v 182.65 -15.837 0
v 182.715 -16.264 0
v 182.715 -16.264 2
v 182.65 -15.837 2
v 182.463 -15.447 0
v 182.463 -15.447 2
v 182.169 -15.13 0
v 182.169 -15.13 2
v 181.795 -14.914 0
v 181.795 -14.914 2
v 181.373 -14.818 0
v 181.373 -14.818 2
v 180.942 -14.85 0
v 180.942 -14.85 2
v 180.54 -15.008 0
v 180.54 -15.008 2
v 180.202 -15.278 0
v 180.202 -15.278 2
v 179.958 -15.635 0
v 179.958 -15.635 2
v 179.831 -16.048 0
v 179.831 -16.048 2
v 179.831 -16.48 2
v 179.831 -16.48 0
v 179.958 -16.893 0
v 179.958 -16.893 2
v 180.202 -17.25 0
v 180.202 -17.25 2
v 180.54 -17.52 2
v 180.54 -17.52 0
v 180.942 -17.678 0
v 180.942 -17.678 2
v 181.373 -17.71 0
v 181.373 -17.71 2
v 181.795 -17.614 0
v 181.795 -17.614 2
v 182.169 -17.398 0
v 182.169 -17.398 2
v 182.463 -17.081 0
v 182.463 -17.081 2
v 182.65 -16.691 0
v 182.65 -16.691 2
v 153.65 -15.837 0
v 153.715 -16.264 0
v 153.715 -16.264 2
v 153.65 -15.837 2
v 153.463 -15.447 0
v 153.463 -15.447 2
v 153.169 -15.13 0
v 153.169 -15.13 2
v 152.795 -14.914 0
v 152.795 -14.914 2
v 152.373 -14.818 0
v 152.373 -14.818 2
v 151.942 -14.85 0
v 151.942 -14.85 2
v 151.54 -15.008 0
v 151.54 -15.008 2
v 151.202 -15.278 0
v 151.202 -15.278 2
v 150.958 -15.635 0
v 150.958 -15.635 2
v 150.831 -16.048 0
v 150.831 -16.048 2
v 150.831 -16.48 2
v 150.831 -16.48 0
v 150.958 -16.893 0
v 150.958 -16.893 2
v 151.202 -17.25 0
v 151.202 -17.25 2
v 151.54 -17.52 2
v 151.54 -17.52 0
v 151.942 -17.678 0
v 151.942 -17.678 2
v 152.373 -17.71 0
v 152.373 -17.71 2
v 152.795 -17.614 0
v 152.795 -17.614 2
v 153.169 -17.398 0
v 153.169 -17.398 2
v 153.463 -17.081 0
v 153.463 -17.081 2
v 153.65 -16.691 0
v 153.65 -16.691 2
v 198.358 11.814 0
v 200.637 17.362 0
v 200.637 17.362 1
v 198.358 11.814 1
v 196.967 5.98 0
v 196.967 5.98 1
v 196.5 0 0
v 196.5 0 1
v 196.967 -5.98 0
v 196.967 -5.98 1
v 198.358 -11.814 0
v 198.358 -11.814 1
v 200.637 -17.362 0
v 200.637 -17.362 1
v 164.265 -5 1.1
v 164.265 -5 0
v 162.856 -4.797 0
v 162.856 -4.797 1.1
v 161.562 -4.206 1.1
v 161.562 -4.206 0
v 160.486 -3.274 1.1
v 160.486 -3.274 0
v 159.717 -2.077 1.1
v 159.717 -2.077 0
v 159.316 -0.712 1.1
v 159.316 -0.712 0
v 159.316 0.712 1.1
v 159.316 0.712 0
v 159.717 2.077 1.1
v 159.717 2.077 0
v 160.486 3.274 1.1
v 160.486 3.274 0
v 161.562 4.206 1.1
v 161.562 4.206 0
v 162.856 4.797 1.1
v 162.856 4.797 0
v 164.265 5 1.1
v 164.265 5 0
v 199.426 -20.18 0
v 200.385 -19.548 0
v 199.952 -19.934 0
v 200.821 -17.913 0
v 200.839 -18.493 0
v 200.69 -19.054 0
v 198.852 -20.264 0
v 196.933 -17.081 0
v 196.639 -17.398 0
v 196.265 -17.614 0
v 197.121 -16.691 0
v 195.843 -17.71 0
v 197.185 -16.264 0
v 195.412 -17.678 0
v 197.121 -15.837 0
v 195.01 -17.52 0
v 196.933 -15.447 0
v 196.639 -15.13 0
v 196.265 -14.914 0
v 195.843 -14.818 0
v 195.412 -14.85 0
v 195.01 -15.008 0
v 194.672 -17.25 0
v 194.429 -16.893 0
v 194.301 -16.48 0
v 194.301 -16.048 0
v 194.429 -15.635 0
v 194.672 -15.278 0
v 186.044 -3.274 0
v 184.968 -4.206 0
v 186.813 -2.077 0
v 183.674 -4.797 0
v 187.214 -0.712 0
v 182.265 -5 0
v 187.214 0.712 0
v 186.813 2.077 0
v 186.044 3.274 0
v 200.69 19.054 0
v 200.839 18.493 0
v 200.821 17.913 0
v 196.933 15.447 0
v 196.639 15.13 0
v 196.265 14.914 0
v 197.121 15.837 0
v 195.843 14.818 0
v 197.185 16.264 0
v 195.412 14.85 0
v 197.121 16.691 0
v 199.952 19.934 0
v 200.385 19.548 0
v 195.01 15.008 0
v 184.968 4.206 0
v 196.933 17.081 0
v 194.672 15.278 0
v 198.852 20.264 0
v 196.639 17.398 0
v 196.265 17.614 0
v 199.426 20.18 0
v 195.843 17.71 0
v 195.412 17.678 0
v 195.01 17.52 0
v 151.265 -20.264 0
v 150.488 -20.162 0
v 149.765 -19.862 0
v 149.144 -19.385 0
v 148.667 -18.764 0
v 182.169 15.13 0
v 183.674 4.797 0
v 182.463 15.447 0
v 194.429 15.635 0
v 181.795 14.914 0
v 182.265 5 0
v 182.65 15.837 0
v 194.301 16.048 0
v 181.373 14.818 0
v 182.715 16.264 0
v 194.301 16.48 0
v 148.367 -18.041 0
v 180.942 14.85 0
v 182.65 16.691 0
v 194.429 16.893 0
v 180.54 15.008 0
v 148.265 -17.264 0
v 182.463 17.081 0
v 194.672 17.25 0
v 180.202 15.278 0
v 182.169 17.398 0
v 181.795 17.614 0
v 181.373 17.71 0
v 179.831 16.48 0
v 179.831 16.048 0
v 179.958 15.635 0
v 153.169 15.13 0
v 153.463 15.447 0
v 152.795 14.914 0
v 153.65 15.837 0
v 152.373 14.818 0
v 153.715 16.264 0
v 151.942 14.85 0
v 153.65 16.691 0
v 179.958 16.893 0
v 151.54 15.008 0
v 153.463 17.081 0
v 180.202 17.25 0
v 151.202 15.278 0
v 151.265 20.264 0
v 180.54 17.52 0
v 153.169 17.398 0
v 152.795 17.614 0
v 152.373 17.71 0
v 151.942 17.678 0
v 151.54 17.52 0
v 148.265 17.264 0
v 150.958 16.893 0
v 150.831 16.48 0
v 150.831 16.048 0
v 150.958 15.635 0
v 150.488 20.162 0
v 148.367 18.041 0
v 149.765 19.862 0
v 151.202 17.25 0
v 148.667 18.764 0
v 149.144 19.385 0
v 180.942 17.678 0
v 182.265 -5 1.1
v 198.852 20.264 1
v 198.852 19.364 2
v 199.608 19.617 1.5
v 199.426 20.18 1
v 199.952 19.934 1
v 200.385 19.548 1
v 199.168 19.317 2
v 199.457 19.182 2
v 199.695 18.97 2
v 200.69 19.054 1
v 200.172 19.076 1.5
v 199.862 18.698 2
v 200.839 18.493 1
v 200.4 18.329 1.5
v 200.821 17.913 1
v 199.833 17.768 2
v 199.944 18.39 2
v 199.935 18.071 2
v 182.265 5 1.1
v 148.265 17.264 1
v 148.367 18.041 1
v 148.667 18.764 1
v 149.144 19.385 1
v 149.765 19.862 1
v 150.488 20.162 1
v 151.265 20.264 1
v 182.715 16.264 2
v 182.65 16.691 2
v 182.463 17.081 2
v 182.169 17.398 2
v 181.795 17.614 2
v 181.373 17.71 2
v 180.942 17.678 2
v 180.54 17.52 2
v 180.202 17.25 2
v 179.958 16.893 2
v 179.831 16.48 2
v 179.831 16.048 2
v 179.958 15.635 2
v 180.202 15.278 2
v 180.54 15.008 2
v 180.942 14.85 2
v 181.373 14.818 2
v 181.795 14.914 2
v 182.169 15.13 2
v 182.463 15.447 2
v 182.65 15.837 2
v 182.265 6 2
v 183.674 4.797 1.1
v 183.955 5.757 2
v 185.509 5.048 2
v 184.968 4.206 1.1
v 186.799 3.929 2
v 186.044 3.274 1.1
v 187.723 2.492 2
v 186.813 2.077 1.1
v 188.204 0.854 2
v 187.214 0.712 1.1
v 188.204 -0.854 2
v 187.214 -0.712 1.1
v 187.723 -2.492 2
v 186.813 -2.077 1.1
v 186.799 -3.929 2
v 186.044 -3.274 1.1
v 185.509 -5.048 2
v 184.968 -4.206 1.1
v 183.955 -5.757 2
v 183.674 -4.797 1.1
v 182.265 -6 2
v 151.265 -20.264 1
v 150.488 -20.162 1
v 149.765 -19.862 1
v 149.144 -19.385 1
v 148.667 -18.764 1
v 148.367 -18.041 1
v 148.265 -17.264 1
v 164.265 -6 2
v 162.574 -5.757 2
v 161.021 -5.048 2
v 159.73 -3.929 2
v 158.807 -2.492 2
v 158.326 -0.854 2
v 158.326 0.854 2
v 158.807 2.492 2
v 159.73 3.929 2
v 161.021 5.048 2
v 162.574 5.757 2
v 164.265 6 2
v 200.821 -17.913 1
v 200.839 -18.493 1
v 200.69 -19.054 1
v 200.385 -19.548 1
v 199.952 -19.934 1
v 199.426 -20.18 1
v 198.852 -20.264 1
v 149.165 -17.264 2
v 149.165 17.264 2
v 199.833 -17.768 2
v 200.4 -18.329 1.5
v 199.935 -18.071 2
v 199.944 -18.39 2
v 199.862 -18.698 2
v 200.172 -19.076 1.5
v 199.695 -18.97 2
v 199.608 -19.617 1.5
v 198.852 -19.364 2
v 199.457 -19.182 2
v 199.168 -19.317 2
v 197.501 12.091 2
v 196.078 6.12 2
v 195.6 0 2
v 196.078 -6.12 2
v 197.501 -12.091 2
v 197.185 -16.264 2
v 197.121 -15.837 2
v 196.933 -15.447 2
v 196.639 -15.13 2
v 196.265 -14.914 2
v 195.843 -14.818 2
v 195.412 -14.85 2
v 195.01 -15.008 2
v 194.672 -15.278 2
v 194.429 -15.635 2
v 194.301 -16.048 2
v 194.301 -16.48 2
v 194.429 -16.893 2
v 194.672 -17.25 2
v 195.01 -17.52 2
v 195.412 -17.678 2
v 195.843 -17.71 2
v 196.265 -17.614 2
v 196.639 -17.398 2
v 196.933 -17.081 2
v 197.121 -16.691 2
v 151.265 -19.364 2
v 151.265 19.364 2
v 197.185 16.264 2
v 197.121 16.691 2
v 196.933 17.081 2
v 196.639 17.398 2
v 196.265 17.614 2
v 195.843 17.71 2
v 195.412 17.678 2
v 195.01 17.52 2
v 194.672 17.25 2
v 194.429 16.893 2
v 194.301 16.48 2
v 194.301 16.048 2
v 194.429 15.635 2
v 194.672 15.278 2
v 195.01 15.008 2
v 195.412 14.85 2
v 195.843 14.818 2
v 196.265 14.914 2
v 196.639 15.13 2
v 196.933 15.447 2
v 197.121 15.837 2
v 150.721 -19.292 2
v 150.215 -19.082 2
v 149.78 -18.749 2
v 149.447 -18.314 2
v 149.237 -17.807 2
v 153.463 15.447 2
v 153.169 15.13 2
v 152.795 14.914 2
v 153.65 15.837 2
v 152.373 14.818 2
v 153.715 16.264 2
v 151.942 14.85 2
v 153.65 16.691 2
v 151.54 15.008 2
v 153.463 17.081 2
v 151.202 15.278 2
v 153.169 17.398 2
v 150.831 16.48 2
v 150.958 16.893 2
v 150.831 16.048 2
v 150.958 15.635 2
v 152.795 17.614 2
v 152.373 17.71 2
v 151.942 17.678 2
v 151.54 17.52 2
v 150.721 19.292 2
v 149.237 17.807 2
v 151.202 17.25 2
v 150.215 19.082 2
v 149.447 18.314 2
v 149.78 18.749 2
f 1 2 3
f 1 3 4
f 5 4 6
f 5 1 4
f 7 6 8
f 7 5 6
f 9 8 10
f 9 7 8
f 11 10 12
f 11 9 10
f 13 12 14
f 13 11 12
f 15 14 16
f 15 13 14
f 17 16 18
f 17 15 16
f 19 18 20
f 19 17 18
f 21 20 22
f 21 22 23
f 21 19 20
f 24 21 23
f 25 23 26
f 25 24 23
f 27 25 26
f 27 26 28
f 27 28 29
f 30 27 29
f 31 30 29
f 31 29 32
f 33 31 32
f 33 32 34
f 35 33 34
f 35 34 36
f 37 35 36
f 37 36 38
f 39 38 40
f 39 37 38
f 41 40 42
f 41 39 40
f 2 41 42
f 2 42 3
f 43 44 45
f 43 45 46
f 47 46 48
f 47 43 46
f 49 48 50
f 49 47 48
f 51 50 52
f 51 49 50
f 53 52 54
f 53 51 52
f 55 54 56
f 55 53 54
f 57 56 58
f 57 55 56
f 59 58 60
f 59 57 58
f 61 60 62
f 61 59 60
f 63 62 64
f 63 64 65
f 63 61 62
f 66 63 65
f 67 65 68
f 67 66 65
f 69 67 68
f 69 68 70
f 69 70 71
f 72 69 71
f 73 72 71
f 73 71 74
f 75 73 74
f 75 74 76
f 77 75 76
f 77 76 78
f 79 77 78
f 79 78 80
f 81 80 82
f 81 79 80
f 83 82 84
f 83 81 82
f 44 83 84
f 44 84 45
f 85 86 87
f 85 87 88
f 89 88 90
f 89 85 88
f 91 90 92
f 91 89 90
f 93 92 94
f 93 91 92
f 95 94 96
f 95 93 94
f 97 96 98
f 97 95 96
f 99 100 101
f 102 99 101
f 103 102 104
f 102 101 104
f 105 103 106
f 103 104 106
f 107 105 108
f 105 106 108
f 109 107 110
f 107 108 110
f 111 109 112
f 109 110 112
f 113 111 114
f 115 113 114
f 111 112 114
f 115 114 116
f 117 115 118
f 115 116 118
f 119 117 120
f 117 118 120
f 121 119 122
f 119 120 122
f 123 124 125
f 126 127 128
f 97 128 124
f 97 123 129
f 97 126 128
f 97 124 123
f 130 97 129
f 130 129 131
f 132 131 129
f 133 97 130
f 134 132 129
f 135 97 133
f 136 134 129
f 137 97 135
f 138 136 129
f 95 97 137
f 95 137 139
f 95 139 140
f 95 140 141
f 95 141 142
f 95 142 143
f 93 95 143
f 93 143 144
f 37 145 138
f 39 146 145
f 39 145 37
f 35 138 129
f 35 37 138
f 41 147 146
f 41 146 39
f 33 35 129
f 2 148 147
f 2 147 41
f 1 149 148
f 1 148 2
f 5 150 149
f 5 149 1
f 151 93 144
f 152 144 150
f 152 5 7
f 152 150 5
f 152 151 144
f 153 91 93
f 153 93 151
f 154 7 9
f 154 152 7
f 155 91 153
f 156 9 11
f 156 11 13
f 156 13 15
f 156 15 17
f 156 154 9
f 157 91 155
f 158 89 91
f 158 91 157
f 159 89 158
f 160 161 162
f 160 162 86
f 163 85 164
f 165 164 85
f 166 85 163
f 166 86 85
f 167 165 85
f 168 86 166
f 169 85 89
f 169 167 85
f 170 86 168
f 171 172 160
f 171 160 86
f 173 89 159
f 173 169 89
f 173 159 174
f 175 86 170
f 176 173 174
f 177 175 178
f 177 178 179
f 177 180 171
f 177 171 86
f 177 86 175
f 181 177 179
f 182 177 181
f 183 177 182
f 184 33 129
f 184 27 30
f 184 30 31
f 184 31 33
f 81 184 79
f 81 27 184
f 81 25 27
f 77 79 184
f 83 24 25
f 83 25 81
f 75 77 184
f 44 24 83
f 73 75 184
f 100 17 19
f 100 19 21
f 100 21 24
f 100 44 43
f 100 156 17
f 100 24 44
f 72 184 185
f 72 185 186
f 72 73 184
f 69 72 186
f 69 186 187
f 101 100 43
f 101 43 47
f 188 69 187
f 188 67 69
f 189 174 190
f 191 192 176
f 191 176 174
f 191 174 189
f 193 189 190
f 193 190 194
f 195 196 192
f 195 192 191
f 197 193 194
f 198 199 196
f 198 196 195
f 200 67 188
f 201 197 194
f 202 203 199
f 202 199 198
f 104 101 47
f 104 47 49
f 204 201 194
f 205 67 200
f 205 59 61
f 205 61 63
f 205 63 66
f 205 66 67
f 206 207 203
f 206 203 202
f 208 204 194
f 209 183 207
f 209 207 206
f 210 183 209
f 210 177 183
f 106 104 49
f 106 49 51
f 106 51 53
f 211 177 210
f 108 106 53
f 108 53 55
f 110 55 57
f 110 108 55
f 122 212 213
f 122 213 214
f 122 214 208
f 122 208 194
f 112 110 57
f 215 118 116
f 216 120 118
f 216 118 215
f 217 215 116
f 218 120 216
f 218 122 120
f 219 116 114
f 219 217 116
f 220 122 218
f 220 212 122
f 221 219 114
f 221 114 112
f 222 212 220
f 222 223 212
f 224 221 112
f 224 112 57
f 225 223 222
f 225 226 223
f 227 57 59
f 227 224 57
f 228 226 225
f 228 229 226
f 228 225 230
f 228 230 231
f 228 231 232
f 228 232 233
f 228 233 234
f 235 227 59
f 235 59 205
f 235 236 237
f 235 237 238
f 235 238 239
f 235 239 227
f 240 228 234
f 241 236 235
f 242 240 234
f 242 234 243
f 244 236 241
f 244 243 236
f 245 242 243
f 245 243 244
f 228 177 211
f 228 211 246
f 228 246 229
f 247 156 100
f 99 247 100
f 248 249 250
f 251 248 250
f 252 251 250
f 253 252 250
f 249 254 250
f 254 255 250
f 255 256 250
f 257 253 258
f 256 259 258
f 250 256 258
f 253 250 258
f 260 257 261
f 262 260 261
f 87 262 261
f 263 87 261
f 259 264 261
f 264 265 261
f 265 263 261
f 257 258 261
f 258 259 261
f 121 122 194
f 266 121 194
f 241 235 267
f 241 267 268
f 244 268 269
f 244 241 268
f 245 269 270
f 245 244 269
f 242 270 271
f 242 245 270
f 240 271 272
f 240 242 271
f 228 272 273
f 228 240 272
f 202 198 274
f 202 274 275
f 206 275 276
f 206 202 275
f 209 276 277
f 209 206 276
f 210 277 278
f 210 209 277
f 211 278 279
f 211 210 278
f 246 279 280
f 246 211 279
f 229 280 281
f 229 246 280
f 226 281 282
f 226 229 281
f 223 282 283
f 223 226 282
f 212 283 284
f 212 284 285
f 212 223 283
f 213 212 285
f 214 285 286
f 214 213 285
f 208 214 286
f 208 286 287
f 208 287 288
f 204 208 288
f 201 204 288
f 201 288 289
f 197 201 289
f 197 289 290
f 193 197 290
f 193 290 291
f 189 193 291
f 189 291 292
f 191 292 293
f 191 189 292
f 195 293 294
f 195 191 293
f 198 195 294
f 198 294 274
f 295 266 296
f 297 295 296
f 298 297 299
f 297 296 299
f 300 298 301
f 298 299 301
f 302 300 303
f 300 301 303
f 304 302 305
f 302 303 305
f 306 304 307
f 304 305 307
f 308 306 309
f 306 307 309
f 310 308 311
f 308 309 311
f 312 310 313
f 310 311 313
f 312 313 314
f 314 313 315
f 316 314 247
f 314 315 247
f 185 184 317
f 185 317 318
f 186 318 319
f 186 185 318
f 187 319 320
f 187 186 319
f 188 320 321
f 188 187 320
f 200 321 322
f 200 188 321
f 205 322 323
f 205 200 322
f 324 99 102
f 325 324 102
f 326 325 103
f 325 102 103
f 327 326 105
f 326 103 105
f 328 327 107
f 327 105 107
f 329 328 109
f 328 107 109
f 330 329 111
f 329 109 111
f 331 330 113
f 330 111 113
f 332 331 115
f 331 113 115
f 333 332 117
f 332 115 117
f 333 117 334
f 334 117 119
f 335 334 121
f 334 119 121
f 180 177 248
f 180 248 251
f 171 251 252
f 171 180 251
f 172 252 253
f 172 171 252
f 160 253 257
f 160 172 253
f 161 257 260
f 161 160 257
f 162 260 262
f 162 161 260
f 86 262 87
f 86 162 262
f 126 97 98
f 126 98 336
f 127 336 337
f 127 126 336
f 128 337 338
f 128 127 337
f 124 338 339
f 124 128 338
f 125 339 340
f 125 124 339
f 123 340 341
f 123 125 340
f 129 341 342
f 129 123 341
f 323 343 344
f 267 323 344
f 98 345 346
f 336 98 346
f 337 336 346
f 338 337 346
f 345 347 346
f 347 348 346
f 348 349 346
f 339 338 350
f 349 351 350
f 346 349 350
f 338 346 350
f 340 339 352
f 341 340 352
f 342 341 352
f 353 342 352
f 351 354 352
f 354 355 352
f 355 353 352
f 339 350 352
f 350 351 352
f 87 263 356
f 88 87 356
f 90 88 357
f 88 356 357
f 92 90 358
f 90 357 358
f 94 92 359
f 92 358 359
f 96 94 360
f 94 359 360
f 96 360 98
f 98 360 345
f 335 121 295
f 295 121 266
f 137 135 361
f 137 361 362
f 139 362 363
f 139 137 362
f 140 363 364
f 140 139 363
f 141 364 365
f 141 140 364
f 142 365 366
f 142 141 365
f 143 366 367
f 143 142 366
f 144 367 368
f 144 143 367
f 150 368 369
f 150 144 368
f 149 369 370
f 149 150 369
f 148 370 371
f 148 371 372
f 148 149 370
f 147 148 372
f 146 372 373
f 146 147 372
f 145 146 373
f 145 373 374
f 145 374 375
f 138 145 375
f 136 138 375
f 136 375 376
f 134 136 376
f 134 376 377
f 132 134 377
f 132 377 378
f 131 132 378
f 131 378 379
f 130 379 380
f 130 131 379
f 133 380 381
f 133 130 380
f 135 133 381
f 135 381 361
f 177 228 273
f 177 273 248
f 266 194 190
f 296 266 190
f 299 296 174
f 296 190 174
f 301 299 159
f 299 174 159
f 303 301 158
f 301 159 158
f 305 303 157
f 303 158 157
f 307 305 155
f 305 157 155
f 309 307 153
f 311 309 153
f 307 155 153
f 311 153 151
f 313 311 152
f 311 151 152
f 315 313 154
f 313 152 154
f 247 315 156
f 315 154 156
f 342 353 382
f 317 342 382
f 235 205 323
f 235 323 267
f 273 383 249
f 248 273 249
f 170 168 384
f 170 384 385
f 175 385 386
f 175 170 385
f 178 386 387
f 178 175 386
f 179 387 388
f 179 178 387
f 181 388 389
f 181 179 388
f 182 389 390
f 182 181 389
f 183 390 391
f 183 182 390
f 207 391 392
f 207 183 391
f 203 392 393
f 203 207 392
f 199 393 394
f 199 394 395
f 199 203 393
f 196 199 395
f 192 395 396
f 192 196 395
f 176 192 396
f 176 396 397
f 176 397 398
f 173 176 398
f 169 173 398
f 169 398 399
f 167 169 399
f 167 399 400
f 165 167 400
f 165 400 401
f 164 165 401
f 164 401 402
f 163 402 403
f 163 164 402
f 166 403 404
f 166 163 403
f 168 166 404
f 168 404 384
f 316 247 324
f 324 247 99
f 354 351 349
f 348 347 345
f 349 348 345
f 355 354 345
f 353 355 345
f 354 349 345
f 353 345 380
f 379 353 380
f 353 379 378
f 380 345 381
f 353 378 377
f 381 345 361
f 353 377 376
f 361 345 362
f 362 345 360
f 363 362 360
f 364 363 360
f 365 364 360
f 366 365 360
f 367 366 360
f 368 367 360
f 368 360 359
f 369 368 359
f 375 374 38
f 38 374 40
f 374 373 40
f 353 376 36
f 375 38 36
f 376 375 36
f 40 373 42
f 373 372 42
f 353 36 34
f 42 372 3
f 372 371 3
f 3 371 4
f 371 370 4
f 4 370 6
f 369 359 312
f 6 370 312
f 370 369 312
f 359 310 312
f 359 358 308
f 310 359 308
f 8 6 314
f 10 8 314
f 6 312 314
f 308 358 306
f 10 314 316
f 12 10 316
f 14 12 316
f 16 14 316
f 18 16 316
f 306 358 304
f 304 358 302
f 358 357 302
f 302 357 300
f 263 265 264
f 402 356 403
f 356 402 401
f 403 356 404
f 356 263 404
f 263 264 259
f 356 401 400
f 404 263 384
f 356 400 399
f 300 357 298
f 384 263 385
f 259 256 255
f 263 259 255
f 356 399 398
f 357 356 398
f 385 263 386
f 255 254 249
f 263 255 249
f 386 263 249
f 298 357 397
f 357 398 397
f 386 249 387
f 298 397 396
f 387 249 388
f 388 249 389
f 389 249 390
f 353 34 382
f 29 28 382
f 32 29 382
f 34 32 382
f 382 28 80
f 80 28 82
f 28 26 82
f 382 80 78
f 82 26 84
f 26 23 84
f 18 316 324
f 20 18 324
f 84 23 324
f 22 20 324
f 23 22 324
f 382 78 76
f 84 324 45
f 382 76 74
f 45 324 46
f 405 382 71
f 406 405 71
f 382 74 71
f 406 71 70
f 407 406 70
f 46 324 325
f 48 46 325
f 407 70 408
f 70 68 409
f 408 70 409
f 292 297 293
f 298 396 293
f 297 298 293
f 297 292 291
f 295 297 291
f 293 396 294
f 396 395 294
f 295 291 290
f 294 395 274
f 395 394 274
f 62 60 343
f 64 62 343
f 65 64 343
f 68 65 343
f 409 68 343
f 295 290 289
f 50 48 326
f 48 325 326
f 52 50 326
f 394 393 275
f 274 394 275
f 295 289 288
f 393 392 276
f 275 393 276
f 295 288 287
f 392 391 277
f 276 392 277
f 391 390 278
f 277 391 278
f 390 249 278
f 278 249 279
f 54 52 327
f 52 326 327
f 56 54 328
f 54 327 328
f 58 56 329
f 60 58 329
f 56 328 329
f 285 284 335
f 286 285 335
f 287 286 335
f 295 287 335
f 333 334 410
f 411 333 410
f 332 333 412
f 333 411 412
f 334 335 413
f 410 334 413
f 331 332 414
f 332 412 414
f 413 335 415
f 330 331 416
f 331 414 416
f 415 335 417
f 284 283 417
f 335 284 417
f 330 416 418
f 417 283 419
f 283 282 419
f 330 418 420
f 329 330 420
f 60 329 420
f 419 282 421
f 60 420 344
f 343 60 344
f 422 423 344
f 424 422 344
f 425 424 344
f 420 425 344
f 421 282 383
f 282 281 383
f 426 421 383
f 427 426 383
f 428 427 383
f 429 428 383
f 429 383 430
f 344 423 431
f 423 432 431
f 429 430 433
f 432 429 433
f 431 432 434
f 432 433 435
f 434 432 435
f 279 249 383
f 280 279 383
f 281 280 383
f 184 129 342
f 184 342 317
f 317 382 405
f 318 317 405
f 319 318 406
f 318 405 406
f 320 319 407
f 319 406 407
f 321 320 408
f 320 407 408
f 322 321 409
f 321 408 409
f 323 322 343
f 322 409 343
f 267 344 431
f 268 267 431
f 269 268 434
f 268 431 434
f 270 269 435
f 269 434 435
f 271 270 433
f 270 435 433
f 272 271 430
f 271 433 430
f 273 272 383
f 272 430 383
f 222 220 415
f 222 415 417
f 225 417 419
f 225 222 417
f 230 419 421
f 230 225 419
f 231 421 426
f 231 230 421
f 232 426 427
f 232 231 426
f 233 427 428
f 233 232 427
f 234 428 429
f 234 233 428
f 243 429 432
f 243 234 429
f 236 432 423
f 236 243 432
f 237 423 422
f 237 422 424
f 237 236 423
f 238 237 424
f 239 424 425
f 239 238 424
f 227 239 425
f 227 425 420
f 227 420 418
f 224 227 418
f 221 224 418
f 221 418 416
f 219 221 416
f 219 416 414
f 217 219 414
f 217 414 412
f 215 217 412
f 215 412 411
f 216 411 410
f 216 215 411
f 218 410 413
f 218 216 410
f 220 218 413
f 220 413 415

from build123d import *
from OCP.BRepFilletAPI import BRepFilletAPI_MakeChamfer

# Parameters (mm, degrees)
SKETCH_2_R      = 1.45
EXTRUDE_1_DEPTH = 2
CHAMFER_2_SIZE  = 1
CHAMFER_2_SIZE2 = 0.900404044
CHAMFER_3_SIZE  = 1
CHAMFER_3_SIZE2 = 0.900404044


with BuildPart() as part:
    # 草图2 → 凸台-拉伸1 (new body)
    with BuildSketch(Plane.XY):
        with BuildLine():
            Line((148.264880132, -17.264045876), (148.264880132, 17.264045876))
            ThreePointArc((148.264880132, 17.264045876), (149.143559788, 19.385366219), (151.264880132, 20.264045876))
            Line((151.264880132, 20.264045876), (198.85204531, 20.264045876))
            ThreePointArc((198.85204531, 20.264045876), (200.555549989, 19.311935091), (200.637129492, 17.362117684))
            ThreePointArc((200.637129492, 17.362117684), (196.5, 0), (200.637129492, -17.362117684))
            ThreePointArc((200.637129492, -17.362117684), (200.555549989, -19.311935091), (198.85204531, -20.264045876))
            Line((198.85204531, -20.264045876), (151.264880132, -20.264045876))
            ThreePointArc((151.264880132, -20.264045876), (149.143559788, -19.385366219), (148.264880132, -17.264045876))
        make_face()
        with Locations((152.264880132, 16.264045876)):
            Circle(SKETCH_2_R, mode=Mode.SUBTRACT)
        with Locations((181.264880132, 16.264045876)):
            Circle(SKETCH_2_R, mode=Mode.SUBTRACT)
        with Locations((195.735119868, 16.264045876)):
            Circle(SKETCH_2_R, mode=Mode.SUBTRACT)
        with Locations((152.264880132, -16.264045876)):
            Circle(SKETCH_2_R, mode=Mode.SUBTRACT)
        with Locations((181.264880132, -16.264045876)):
            Circle(SKETCH_2_R, mode=Mode.SUBTRACT)
        with Locations((195.735119868, -16.264045876)):
            Circle(SKETCH_2_R, mode=Mode.SUBTRACT)
        with BuildLine():
            Line((164.264880132, 5), (182.264880132, 5))
            ThreePointArc((182.264880132, 5), (187.264880132, 0), (182.264880132, -5))
            Line((182.264880132, -5), (164.264880132, -5))
            ThreePointArc((164.264880132, -5), (159.264880132, 0), (164.264880132, 5))
        make_face(mode=Mode.SUBTRACT)
    extrude(amount=EXTRUDE_1_DEPTH)

    # 倒角2: one chamfer whose edges measure the first distance from different faces: ONE call of the kernel's chamfer builder (chamfer() names one face for all edges)
    chamfer_2_edges_1 = [part.edges().sort_by_distance(p)[0] for p in [
        (200.555549989, -19.311935091, 2),
    ]]
    chamfer_2_side_1 = [part.faces().sort_by_distance(p)[0] for p in [
        (200.555549989, -19.311935091, 1),
    ]]
    chamfer_2_edges_2 = [part.edges().sort_by_distance(p)[0] for p in [
        (196.5, 0, 2),
    ]]
    chamfer_2_side_2 = [part.faces().sort_by_distance(p)[0] for p in [
        (196.5, 0, 1),
    ]]
    chamfer_2_edges_3 = [part.edges().sort_by_distance(p)[0] for p in [
        (200.555549989, 19.311935091, 2),
    ]]
    chamfer_2_side_3 = [part.faces().sort_by_distance(p)[0] for p in [
        (200.555549989, 19.311935091, 1),
    ]]
    chamfer_2_edges_4 = [part.edges().sort_by_distance(p)[0] for p in [
        (175.058462721, 20.264045876, 2),
    ]]
    chamfer_2_side_4 = [part.faces().sort_by_distance(p)[0] for p in [
        (175.058462721, 20.264045876, 1),
    ]]
    chamfer_2_edges_5 = [part.edges().sort_by_distance(p)[0] for p in [
        (149.143559788, 19.385366219, 2),
    ]]
    chamfer_2_side_5 = [part.faces().sort_by_distance(p)[0] for p in [
        (149.143559788, 19.385366219, 1),
    ]]
    chamfer_2_edges_6 = [part.edges().sort_by_distance(p)[0] for p in [
        (148.264880132, 0, 2),
    ]]
    chamfer_2_side_6 = [part.faces().sort_by_distance(p)[0] for p in [
        (148.264880132, 0, 1),
    ]]
    chamfer_2_edges_7 = [part.edges().sort_by_distance(p)[0] for p in [
        (149.143559788, -19.385366219, 2),
    ]]
    chamfer_2_side_7 = [part.faces().sort_by_distance(p)[0] for p in [
        (149.143559788, -19.385366219, 1),
    ]]
    chamfer_2_edges_8 = [part.edges().sort_by_distance(p)[0] for p in [
        (175.058462721, -20.264045876, 2),
    ]]
    chamfer_2_side_8 = [part.faces().sort_by_distance(p)[0] for p in [
        (175.058462721, -20.264045876, 1),
    ]]
    chamfer_2 = BRepFilletAPI_MakeChamfer(part.part.solid().wrapped)
    for e in chamfer_2_edges_1:
        chamfer_2.Add(CHAMFER_2_SIZE, CHAMFER_2_SIZE2, e.wrapped, chamfer_2_side_1[0].wrapped)  # the first distance lies on this face
    for e in chamfer_2_edges_2:
        chamfer_2.Add(CHAMFER_2_SIZE, CHAMFER_2_SIZE2, e.wrapped, chamfer_2_side_2[0].wrapped)  # the first distance lies on this face
    for e in chamfer_2_edges_3:
        chamfer_2.Add(CHAMFER_2_SIZE, CHAMFER_2_SIZE2, e.wrapped, chamfer_2_side_3[0].wrapped)  # the first distance lies on this face
    for e in chamfer_2_edges_4:
        chamfer_2.Add(CHAMFER_2_SIZE, CHAMFER_2_SIZE2, e.wrapped, chamfer_2_side_4[0].wrapped)  # the first distance lies on this face
    for e in chamfer_2_edges_5:
        chamfer_2.Add(CHAMFER_2_SIZE, CHAMFER_2_SIZE2, e.wrapped, chamfer_2_side_5[0].wrapped)  # the first distance lies on this face
    for e in chamfer_2_edges_6:
        chamfer_2.Add(CHAMFER_2_SIZE, CHAMFER_2_SIZE2, e.wrapped, chamfer_2_side_6[0].wrapped)  # the first distance lies on this face
    for e in chamfer_2_edges_7:
        chamfer_2.Add(CHAMFER_2_SIZE, CHAMFER_2_SIZE2, e.wrapped, chamfer_2_side_7[0].wrapped)  # the first distance lies on this face
    for e in chamfer_2_edges_8:
        chamfer_2.Add(CHAMFER_2_SIZE, CHAMFER_2_SIZE2, e.wrapped, chamfer_2_side_8[0].wrapped)  # the first distance lies on this face
    add(Compound.cast(chamfer_2.Shape()), mode=Mode.REPLACE)

    # 倒角3
    chamfer_3_edges = [part.edges().sort_by_distance(p)[0] for p in [
        (159.264880132, 0, 2),
        (173.264880132, -5, 2),
        (187.264880132, 0, 2),
        (173.264880132, 5, 2),
    ]]
    chamfer_3_side = [part.faces().sort_by_distance(p)[0] for p in [
        (199.244635879, -18.505542966, 2),
    ]]
    chamfer(chamfer_3_edges, length=CHAMFER_3_SIZE, length2=CHAMFER_3_SIZE2, reference=chamfer_3_side[0])


solid = part.part
